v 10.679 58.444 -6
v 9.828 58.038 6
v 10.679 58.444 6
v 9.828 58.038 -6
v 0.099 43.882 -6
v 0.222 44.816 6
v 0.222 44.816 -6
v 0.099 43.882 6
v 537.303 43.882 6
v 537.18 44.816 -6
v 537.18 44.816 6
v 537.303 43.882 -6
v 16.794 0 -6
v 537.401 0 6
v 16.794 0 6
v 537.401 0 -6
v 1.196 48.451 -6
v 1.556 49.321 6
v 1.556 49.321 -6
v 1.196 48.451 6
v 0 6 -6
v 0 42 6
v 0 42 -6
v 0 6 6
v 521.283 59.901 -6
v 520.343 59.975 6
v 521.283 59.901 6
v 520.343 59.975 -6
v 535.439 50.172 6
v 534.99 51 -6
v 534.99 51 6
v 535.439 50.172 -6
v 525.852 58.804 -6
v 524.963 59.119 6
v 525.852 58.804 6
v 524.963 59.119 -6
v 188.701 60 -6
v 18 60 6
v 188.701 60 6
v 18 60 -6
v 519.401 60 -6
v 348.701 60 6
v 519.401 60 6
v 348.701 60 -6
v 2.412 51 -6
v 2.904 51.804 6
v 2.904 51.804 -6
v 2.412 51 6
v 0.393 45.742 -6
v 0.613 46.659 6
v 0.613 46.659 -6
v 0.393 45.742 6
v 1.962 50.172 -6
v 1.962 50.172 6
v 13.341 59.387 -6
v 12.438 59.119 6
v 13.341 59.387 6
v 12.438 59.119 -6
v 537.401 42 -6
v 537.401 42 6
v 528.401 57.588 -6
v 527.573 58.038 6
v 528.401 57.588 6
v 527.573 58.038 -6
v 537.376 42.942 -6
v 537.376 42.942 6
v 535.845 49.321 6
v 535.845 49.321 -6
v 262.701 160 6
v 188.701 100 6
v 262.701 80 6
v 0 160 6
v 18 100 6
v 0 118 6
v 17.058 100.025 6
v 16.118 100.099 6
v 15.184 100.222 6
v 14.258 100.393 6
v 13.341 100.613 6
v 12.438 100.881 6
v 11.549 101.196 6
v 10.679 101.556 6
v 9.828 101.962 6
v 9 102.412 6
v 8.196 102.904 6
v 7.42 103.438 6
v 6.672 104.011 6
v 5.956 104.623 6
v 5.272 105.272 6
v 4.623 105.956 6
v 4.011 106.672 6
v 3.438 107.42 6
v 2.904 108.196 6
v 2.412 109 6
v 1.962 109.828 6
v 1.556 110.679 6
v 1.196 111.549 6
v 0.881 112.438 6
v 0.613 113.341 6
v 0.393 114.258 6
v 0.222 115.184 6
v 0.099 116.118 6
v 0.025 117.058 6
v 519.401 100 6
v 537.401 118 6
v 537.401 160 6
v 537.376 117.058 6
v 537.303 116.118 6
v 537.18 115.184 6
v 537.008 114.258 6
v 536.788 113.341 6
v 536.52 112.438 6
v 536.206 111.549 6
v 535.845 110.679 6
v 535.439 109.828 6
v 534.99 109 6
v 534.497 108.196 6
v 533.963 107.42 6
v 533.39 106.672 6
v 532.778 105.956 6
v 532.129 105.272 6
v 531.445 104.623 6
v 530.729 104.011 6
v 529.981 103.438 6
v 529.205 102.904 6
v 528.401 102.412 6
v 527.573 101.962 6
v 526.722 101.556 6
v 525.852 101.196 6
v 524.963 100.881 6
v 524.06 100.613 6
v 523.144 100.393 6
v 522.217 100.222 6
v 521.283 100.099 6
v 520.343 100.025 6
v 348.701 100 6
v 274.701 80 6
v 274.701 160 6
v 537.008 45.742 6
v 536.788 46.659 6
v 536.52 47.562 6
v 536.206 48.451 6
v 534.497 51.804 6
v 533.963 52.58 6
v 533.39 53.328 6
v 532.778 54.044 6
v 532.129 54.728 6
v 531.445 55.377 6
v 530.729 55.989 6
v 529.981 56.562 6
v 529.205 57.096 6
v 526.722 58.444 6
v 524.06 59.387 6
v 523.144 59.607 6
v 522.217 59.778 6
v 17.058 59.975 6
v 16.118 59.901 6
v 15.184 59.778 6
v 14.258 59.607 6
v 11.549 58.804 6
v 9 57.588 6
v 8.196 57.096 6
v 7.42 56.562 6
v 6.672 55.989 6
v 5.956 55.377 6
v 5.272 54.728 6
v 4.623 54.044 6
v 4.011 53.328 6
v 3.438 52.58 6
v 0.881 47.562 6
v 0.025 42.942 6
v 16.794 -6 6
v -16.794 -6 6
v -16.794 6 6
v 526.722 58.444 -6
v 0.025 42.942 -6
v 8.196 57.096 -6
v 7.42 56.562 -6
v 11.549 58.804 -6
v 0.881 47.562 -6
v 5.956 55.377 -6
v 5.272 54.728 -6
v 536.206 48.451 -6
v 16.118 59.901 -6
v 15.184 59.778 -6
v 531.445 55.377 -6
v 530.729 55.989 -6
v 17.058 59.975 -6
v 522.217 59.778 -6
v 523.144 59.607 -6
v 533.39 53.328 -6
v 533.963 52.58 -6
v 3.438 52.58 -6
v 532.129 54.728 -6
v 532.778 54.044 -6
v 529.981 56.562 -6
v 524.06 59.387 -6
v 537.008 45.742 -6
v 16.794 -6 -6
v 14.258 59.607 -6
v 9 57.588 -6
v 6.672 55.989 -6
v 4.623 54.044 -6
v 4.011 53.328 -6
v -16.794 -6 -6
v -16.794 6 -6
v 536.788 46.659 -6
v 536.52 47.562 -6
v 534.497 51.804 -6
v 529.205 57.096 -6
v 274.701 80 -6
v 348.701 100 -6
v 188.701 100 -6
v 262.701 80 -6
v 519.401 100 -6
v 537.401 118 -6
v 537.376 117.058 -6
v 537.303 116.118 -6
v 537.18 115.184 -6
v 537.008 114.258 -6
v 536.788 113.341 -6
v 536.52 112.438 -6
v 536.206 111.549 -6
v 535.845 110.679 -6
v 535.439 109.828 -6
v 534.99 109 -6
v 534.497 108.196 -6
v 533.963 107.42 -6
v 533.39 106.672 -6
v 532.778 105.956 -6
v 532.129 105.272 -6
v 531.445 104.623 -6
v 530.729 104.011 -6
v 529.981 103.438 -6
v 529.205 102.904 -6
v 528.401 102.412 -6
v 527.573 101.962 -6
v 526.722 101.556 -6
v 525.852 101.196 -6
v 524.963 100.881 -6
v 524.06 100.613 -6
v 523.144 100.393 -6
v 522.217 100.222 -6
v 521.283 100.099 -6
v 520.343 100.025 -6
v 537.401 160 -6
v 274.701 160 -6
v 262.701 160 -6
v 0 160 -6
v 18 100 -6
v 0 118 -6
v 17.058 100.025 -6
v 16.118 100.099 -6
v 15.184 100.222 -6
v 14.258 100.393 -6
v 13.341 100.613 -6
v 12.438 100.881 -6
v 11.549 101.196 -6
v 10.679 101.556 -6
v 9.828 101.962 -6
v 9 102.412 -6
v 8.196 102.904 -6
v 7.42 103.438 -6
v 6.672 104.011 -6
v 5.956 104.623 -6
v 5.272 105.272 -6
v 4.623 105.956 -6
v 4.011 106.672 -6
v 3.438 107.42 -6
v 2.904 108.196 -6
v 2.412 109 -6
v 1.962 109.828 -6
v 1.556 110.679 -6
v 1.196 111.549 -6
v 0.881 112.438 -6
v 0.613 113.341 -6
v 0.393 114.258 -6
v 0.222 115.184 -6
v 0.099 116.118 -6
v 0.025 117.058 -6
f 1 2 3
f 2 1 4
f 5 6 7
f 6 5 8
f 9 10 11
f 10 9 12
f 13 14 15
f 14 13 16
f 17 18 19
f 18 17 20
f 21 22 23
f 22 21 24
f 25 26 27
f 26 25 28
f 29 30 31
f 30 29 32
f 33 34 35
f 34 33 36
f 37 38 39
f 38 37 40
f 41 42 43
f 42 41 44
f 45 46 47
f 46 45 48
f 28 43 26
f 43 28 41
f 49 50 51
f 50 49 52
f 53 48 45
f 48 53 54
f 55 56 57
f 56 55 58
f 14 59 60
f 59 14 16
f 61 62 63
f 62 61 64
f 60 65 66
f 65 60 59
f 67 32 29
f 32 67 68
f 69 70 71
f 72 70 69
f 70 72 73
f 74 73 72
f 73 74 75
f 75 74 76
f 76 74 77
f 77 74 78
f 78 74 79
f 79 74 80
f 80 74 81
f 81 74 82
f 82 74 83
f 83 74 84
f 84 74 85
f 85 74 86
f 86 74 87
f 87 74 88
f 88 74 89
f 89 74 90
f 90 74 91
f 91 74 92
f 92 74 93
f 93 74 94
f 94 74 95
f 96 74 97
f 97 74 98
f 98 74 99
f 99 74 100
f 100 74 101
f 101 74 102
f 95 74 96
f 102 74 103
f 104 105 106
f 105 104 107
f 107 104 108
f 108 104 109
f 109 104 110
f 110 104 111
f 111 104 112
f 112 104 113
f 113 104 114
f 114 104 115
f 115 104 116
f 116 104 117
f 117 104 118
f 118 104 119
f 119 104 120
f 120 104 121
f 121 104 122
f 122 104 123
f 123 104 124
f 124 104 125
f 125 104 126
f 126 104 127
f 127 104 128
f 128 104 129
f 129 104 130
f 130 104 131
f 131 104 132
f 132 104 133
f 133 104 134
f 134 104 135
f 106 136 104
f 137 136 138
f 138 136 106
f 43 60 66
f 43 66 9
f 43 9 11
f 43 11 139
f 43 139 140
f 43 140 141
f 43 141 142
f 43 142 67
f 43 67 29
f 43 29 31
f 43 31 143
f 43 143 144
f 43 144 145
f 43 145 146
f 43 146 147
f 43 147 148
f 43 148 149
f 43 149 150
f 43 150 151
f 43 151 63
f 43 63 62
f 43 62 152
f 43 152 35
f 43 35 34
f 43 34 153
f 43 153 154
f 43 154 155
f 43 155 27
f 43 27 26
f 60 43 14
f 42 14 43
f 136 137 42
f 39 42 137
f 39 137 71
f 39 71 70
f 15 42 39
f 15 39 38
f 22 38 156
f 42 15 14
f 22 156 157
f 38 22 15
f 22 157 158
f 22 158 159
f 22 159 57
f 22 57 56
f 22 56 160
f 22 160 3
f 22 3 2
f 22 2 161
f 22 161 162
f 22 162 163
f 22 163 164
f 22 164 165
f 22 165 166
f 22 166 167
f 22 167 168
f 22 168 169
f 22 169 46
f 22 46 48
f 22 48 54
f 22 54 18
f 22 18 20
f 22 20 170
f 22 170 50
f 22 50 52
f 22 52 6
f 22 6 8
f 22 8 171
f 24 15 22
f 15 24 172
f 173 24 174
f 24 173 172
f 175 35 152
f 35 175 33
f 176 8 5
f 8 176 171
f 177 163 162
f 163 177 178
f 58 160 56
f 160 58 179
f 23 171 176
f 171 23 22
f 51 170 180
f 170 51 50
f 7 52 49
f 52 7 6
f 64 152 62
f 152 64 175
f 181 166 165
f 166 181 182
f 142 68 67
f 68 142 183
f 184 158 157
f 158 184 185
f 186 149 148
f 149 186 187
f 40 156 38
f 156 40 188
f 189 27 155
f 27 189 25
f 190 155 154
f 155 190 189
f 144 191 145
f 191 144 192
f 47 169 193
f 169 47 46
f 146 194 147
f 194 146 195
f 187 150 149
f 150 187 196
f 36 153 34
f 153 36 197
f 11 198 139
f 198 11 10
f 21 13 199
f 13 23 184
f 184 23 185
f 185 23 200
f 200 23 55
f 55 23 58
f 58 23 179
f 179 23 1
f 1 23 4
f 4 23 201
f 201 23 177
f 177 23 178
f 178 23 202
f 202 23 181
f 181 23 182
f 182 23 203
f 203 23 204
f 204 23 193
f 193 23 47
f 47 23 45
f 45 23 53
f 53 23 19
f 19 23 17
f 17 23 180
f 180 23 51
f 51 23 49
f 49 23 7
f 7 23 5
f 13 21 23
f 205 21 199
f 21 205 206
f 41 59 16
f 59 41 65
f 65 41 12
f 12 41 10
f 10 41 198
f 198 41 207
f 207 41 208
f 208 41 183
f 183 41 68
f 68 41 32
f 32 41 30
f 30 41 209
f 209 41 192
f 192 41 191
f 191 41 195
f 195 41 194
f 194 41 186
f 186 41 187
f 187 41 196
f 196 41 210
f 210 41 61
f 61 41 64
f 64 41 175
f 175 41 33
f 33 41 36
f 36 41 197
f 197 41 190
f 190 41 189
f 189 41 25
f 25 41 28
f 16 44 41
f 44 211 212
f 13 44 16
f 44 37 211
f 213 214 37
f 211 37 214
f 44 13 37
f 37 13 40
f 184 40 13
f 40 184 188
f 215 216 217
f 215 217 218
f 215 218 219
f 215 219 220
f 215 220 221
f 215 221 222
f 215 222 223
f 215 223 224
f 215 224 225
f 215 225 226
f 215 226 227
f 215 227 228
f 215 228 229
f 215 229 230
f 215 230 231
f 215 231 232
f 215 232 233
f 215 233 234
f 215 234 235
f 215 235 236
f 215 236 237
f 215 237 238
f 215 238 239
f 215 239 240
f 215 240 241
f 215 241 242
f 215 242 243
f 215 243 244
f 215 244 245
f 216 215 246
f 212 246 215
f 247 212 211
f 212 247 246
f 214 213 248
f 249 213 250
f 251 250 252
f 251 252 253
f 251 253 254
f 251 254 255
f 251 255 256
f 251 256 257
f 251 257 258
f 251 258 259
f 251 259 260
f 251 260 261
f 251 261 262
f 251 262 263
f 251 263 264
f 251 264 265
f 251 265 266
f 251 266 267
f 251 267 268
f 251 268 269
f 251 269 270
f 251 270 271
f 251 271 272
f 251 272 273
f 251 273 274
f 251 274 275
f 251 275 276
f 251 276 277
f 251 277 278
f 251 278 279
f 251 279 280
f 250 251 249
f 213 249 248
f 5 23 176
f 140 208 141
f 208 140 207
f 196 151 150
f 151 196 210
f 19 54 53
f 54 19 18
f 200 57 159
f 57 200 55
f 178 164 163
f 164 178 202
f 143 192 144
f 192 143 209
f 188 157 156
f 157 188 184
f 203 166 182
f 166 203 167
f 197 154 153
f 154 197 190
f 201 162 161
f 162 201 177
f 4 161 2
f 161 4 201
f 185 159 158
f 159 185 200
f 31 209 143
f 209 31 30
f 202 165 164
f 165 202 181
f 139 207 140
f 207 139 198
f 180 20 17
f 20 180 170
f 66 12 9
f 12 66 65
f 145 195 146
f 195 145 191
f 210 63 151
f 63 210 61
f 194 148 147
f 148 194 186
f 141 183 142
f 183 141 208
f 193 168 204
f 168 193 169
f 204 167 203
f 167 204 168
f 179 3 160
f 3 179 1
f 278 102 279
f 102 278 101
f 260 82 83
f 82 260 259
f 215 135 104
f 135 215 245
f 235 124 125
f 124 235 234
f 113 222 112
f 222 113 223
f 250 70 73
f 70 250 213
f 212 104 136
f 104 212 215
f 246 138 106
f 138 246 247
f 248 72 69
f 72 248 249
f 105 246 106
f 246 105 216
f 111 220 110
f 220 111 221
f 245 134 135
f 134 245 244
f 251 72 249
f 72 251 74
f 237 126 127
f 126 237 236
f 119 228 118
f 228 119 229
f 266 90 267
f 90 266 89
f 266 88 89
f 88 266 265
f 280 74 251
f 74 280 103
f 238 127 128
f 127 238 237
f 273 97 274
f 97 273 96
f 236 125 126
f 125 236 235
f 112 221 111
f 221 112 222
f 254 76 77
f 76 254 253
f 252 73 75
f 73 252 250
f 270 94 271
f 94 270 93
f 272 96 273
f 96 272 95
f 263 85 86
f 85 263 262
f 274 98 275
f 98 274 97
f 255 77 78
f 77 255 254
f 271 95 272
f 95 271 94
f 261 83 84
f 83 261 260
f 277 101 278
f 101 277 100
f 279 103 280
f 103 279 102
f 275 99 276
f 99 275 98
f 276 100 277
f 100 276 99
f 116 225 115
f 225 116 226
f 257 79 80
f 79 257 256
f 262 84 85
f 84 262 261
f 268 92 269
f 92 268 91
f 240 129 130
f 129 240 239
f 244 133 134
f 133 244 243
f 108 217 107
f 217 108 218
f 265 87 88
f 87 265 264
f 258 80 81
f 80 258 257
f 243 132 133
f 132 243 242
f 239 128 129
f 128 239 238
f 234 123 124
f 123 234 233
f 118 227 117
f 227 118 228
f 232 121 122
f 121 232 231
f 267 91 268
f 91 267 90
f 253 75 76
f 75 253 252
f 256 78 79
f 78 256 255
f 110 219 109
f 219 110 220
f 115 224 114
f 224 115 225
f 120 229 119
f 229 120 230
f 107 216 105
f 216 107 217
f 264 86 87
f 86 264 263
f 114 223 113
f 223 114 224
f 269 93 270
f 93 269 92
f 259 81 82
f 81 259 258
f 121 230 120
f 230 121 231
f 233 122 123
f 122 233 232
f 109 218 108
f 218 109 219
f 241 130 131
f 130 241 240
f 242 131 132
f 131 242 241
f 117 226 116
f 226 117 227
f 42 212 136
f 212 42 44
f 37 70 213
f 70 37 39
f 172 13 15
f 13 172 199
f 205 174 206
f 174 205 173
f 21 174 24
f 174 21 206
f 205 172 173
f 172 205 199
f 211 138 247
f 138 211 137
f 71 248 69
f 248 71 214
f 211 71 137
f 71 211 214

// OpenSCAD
thickness = 12;
top_edge = 380;
top_radius = 48;
base_edge = sqrt(top_edge * top_edge * 2);
base_span_height = 60;
base_span_radius = 36;
base_stem_height = 40;
base_stem_width = 160;
$fn=120;

module top(x,y,z,r){
    hull(){
        translate([r/2,r/2,-z/2]) cylinder(h=z,d=r);
        translate([-(r/2)+x,r/2,-z/2]) cylinder(h=z,d=r);
        translate([(r/2),-(r/2)+y,0]) cylinder(h=z,d=r);
        translate([-(r/2)+x,-(r/2)+y,0]) cylinder(h=z,d=r);
    }
}

module base_span(x,y,z,r){
    hull(){
        translate([r/2,r/2,0]) cube([r,r,z], true);
        translate([-(r/2)+x,r/2,0]) cube([r,r,z], true);
        translate([(r/2),-(r/2)+y,-z/2]) cylinder(h=z,d=r);
        translate([-(r/2)+x,-(r/2)+y,-z/2]) cylinder(h=z,d=r);
    }
}

module base_section(length, span_height, stem_height, stem_width, thickness, radius){ 
    union() {
        base_span(length, span_height, thickness, radius);
        translate([0, (span_height * 2 + stem_height), 0]) {
            mirror([0,1,0]){
                base_span(length, span_height, thickness, radius);
            }
        }
        translate([length / 2, span_height + stem_height / 2, 0]) {
            cube([stem_width, stem_height, thickness], true);
        }
        cube([length / 16, thickness, thickness], true);
    }
}

module base(base_edge, base_span_height, base_stem_height, base_stem_width, thickness, base_span_radius) {
    // section 1
        difference() {
        base_section(base_edge, base_span_height, base_stem_height, base_stem_width, thickness, base_span_radius);
        translate([base_edge / 2 - thickness / 2, base_span_height + base_stem_height / 2, -thickness / 2]) {
            cube([thickness, base_span_height + base_stem_height / 2, thickness]);
        }
    }/*
    // section 2
    difference() {
        base_section(base_edge, base_span_height, base_stem_height, base_stem_width, thickness, base_span_radius);
        translate([base_edge / 2 - thickness / 2, 0, -thickness / 2]) {
            cube([thickness, base_span_height + base_stem_height / 2, thickness]);
        }
    }*/
}

//top(top_edge, top_edge, thickness, top_radius);
base(base_edge, base_span_height, base_stem_height, base_stem_width, thickness, base_span_radius);
